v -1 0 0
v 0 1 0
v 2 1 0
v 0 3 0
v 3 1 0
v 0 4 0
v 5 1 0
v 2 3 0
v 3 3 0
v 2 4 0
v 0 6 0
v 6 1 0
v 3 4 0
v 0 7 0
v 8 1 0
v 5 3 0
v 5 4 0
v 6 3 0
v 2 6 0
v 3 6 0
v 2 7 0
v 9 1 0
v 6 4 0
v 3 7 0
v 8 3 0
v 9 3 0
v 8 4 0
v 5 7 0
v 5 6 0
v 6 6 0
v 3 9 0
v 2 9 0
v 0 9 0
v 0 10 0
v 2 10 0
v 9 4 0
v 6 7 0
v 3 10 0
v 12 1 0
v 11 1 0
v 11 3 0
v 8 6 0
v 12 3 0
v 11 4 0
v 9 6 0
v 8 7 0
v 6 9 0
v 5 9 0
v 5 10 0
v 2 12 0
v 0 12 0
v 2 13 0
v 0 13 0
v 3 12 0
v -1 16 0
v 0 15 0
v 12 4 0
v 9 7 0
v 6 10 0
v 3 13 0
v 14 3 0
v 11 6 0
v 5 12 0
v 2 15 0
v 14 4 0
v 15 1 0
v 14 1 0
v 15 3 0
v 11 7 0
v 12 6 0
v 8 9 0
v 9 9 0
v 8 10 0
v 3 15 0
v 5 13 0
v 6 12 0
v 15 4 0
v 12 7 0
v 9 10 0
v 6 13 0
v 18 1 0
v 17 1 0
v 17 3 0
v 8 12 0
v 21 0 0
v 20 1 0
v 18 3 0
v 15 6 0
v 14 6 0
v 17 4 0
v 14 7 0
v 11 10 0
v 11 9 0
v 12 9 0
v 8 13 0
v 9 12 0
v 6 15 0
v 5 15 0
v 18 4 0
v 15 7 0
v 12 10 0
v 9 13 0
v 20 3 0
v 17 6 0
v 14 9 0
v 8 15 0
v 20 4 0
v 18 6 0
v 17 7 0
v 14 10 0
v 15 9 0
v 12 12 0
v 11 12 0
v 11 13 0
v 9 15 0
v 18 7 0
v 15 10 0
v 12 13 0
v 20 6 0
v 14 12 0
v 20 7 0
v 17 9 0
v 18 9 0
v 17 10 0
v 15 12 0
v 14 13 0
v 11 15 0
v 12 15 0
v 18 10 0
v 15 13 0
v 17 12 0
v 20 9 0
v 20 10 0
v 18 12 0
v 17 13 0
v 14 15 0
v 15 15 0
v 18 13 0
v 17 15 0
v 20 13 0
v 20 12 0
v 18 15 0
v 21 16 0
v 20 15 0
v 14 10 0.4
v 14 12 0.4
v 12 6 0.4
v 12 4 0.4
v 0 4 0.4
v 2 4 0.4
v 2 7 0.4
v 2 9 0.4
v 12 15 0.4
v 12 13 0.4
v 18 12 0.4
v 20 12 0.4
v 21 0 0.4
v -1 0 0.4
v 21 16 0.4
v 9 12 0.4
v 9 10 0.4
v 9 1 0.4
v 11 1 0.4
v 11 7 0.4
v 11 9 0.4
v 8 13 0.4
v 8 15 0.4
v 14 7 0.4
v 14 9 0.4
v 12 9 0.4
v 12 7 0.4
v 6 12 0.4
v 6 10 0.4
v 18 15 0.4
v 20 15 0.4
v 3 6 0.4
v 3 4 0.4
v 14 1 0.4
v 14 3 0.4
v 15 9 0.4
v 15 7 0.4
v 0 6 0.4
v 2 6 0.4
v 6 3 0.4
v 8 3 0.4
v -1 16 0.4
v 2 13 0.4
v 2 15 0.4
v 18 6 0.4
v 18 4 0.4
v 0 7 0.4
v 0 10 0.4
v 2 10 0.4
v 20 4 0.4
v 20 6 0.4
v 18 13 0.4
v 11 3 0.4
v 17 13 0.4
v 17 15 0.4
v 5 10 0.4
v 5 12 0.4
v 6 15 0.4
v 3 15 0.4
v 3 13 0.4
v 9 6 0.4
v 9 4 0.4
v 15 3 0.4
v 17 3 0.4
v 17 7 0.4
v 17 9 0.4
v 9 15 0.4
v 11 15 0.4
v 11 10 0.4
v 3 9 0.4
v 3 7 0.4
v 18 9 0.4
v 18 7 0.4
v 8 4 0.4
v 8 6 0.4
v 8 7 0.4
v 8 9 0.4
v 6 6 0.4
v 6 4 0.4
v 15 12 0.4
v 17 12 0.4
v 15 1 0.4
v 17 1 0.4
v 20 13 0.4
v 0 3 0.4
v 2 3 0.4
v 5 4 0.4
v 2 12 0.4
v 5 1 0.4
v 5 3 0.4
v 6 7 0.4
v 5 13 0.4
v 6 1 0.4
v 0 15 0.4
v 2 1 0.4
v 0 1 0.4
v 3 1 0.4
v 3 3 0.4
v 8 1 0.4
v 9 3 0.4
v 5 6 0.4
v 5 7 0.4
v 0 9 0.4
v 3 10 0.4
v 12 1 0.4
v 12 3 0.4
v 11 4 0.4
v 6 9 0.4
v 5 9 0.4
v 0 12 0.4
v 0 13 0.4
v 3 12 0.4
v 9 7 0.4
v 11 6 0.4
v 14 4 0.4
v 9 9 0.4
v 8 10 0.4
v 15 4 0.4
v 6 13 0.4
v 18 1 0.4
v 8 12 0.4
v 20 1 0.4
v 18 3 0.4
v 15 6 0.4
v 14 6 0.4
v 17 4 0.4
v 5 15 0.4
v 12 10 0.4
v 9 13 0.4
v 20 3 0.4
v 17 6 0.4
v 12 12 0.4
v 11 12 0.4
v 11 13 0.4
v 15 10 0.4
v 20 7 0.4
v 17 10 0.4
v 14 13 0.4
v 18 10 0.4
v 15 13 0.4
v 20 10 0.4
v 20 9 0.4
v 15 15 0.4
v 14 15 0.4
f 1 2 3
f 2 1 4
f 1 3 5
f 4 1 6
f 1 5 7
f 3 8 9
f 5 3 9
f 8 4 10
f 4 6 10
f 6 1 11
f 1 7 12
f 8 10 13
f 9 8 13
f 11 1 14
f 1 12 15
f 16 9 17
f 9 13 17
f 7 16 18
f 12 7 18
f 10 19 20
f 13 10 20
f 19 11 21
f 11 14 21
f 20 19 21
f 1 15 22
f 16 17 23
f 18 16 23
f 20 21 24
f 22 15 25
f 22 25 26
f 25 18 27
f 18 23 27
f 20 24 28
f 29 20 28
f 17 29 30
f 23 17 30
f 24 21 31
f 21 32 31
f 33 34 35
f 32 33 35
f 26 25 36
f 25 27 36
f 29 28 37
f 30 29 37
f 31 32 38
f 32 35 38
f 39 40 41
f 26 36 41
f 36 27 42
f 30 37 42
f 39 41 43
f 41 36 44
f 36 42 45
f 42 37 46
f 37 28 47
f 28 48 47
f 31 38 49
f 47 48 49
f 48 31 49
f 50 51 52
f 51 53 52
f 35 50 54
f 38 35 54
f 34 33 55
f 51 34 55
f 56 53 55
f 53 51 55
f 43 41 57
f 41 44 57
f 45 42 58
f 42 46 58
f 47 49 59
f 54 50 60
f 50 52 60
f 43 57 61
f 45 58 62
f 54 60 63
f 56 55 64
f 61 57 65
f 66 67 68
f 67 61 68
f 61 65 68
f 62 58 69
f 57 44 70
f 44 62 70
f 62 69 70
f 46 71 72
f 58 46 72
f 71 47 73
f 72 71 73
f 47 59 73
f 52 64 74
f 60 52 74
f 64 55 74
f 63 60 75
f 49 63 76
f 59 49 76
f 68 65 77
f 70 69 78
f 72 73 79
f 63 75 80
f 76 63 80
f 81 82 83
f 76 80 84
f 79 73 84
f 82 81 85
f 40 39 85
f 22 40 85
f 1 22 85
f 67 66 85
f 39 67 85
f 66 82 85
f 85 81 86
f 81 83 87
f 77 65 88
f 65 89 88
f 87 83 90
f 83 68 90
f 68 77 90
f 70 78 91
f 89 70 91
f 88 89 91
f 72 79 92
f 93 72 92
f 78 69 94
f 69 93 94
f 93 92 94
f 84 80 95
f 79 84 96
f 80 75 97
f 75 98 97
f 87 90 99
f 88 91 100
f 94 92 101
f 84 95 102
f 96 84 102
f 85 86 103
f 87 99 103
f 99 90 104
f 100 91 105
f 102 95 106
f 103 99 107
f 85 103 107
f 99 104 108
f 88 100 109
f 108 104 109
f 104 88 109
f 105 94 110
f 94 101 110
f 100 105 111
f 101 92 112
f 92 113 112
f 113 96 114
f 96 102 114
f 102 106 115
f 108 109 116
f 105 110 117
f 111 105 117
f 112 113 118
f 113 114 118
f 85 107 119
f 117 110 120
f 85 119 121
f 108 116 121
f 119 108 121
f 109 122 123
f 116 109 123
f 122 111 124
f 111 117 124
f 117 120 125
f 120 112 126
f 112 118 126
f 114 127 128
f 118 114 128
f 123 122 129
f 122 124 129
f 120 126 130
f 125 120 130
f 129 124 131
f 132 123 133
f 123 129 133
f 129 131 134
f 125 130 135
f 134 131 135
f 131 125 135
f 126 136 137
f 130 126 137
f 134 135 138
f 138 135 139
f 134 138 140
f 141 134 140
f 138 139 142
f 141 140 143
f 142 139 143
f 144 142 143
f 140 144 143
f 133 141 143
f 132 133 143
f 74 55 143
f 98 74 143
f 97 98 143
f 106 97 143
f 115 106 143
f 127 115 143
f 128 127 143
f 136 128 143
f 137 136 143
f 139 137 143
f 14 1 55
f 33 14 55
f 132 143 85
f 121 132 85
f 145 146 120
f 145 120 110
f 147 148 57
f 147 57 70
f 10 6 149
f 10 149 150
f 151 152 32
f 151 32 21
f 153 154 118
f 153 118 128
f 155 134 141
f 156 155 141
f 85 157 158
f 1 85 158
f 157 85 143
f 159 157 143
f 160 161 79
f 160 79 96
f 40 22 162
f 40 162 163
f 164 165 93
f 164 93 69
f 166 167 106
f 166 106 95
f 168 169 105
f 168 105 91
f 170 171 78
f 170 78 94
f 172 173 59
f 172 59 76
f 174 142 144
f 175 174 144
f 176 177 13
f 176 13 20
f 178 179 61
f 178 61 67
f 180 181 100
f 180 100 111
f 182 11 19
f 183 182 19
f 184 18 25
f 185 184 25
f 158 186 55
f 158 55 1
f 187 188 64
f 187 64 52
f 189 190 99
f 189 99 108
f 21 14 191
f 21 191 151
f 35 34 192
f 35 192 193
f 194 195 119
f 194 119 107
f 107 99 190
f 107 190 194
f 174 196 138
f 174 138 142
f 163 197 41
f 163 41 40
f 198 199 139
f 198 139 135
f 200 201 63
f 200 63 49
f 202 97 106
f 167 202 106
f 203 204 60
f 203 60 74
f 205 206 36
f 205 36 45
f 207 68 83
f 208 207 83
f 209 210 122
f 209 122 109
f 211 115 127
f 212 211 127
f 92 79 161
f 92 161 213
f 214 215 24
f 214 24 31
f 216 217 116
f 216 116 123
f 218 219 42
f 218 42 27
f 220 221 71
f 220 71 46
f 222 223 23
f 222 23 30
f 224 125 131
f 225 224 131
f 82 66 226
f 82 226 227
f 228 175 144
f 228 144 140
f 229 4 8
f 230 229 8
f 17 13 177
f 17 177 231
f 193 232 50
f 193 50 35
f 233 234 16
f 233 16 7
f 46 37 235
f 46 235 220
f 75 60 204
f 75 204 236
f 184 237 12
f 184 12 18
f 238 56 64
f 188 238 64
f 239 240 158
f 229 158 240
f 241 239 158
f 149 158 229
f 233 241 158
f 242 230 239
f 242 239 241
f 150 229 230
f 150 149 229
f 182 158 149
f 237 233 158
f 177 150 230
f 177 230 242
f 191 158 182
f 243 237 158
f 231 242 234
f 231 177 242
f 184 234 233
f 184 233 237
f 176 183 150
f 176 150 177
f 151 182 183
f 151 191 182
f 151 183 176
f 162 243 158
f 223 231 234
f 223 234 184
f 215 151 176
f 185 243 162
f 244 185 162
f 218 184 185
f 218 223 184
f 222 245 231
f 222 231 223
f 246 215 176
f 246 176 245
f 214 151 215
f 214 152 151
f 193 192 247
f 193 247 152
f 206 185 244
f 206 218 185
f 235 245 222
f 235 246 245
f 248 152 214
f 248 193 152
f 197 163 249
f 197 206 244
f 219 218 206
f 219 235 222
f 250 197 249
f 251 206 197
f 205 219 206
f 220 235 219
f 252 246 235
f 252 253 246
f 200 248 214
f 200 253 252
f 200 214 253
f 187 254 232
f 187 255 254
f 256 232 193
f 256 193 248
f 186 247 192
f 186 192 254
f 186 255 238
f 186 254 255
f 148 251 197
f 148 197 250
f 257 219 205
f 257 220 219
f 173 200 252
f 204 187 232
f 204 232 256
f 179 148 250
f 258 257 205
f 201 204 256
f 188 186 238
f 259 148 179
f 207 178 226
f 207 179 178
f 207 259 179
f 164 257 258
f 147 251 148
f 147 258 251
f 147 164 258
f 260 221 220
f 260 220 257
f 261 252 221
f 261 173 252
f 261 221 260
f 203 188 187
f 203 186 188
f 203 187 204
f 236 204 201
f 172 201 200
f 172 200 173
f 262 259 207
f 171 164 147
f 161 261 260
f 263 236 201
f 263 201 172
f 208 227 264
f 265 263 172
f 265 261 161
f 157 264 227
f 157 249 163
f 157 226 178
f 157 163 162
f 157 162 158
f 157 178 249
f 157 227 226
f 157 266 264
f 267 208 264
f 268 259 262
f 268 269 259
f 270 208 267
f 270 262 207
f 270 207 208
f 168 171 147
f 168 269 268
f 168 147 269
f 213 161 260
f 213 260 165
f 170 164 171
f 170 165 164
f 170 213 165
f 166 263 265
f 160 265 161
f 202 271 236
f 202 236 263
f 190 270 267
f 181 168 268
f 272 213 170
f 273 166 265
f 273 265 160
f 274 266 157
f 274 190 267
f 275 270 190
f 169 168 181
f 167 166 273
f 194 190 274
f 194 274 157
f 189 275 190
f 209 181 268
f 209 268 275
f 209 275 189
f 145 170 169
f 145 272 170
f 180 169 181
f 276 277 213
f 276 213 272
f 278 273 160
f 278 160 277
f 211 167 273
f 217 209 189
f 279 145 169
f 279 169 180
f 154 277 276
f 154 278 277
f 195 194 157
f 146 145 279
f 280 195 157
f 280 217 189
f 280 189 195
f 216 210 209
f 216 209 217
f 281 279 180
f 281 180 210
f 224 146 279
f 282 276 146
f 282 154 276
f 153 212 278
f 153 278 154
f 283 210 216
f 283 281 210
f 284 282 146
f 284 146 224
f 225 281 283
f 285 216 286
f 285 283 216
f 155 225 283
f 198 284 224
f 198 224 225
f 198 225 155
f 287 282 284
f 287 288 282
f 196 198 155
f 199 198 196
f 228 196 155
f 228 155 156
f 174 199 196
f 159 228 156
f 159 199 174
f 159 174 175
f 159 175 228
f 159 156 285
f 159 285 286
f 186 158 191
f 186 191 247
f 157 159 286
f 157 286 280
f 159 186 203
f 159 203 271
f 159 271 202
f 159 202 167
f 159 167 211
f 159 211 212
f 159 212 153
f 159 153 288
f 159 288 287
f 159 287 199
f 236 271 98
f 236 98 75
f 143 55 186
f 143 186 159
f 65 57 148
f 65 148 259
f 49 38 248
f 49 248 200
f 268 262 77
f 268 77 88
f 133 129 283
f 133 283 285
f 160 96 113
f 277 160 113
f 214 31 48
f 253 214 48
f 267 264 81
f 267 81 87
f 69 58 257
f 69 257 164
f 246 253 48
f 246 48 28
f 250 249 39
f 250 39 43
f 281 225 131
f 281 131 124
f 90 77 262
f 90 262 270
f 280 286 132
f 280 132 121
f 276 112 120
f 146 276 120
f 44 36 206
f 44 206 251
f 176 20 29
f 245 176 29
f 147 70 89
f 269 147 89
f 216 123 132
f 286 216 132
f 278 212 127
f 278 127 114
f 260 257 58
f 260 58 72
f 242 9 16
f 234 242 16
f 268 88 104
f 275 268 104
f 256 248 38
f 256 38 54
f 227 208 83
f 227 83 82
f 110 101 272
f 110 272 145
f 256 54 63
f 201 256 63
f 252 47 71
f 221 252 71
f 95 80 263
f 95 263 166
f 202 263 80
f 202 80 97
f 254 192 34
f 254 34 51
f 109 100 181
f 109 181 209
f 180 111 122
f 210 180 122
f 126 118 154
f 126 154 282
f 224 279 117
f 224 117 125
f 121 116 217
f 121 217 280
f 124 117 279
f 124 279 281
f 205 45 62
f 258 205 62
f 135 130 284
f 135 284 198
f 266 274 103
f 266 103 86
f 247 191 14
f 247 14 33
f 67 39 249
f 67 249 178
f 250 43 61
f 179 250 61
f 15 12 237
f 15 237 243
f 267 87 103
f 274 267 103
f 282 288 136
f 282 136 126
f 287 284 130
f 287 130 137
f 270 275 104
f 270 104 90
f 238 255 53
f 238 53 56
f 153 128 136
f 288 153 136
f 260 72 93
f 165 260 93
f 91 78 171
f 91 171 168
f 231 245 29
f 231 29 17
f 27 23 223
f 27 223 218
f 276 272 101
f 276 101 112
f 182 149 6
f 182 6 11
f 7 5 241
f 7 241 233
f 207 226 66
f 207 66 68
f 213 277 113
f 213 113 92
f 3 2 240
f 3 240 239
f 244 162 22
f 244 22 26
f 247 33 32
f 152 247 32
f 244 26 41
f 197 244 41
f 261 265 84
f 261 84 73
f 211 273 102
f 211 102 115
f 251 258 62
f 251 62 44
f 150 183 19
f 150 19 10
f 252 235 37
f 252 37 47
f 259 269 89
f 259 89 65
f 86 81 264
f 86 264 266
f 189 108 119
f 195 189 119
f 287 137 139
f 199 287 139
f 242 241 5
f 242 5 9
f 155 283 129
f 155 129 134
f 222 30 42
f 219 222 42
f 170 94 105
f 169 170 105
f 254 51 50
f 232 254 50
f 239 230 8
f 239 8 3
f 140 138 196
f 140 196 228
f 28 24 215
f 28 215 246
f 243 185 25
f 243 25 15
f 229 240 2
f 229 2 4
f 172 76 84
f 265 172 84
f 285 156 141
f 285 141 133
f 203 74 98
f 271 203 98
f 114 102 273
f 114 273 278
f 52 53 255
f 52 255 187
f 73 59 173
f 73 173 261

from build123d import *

# Parameters (mm, degrees)
SKETCH_1_W             = 21
SKETCH_1_H             = 1
EXTRUDE_1_DEPTH        = 0.4
PATTERN_LINEAR_1_COUNT = 6
PATTERN_LINEAR_1_PITCH = 3
EXTRUDE_3_DEPTH        = 0.4
PATTERN_LINEAR_2_COUNT = 8
PATTERN_LINEAR_2_PITCH = 3


with BuildPart() as part:
    # 草图1 → 凸台-拉伸1 (new body)
    with BuildSketch(Plane.XY):
        with Locations((10.5, 0.5)):
            Rectangle(SKETCH_1_W, SKETCH_1_H)
    extrude(amount=EXTRUDE_1_DEPTH)


with BuildPart() as pattern_linear_1_1:
    # 阵列(线性)1: pattern copy
    add(part.part.moved(Location(Vector(0, 1, 0) * (1 * PATTERN_LINEAR_1_PITCH))))


with BuildPart() as pattern_linear_1_2:
    # 阵列(线性)1: pattern copy
    add(part.part.moved(Location(Vector(0, 1, 0) * (2 * PATTERN_LINEAR_1_PITCH))))


with BuildPart() as pattern_linear_1_3:
    # 阵列(线性)1: pattern copy
    add(part.part.moved(Location(Vector(0, 1, 0) * (3 * PATTERN_LINEAR_1_PITCH))))


with BuildPart() as pattern_linear_1_4:
    # 阵列(线性)1: pattern copy
    add(part.part.moved(Location(Vector(0, 1, 0) * (4 * PATTERN_LINEAR_1_PITCH))))


with BuildPart() as pattern_linear_1_5:
    # 阵列(线性)1: pattern copy
    add(part.part.moved(Location(Vector(0, 1, 0) * (5 * PATTERN_LINEAR_1_PITCH))))


with BuildPart() as part_1:
    add(part.part)

    add(pattern_linear_1_1.part)  # 凸台-拉伸3 merges 阵列(线性)1_1

    add(pattern_linear_1_2.part)  # 凸台-拉伸3 merges 阵列(线性)1_2

    add(pattern_linear_1_3.part)  # 凸台-拉伸3 merges 阵列(线性)1_3
    # 草图3 → 凸台-拉伸3 (add)
    with BuildSketch(Plane.XY.offset(0.4)):
        Polygon((0, 16), (0, 10), (0, 0), (-1, 0), (-1, 10.98507125), (-1, 16), align=None)
    extrude_3 = extrude(amount=-EXTRUDE_3_DEPTH)

    # 阵列(线性)2: 凸台-拉伸3 ×8
    with Locations(*[(i * PATTERN_LINEAR_2_PITCH, 0, 0) for i in range(1, PATTERN_LINEAR_2_COUNT)]):
        add(extrude_3)

    # Combine 1: read off the stored shape, not the designer's step
    # Combine 1: union 阵列(线性)1_4, 阵列(线性)1_5
    add(pattern_linear_1_4.part)
    add(pattern_linear_1_5.part)


solid = part_1.part
